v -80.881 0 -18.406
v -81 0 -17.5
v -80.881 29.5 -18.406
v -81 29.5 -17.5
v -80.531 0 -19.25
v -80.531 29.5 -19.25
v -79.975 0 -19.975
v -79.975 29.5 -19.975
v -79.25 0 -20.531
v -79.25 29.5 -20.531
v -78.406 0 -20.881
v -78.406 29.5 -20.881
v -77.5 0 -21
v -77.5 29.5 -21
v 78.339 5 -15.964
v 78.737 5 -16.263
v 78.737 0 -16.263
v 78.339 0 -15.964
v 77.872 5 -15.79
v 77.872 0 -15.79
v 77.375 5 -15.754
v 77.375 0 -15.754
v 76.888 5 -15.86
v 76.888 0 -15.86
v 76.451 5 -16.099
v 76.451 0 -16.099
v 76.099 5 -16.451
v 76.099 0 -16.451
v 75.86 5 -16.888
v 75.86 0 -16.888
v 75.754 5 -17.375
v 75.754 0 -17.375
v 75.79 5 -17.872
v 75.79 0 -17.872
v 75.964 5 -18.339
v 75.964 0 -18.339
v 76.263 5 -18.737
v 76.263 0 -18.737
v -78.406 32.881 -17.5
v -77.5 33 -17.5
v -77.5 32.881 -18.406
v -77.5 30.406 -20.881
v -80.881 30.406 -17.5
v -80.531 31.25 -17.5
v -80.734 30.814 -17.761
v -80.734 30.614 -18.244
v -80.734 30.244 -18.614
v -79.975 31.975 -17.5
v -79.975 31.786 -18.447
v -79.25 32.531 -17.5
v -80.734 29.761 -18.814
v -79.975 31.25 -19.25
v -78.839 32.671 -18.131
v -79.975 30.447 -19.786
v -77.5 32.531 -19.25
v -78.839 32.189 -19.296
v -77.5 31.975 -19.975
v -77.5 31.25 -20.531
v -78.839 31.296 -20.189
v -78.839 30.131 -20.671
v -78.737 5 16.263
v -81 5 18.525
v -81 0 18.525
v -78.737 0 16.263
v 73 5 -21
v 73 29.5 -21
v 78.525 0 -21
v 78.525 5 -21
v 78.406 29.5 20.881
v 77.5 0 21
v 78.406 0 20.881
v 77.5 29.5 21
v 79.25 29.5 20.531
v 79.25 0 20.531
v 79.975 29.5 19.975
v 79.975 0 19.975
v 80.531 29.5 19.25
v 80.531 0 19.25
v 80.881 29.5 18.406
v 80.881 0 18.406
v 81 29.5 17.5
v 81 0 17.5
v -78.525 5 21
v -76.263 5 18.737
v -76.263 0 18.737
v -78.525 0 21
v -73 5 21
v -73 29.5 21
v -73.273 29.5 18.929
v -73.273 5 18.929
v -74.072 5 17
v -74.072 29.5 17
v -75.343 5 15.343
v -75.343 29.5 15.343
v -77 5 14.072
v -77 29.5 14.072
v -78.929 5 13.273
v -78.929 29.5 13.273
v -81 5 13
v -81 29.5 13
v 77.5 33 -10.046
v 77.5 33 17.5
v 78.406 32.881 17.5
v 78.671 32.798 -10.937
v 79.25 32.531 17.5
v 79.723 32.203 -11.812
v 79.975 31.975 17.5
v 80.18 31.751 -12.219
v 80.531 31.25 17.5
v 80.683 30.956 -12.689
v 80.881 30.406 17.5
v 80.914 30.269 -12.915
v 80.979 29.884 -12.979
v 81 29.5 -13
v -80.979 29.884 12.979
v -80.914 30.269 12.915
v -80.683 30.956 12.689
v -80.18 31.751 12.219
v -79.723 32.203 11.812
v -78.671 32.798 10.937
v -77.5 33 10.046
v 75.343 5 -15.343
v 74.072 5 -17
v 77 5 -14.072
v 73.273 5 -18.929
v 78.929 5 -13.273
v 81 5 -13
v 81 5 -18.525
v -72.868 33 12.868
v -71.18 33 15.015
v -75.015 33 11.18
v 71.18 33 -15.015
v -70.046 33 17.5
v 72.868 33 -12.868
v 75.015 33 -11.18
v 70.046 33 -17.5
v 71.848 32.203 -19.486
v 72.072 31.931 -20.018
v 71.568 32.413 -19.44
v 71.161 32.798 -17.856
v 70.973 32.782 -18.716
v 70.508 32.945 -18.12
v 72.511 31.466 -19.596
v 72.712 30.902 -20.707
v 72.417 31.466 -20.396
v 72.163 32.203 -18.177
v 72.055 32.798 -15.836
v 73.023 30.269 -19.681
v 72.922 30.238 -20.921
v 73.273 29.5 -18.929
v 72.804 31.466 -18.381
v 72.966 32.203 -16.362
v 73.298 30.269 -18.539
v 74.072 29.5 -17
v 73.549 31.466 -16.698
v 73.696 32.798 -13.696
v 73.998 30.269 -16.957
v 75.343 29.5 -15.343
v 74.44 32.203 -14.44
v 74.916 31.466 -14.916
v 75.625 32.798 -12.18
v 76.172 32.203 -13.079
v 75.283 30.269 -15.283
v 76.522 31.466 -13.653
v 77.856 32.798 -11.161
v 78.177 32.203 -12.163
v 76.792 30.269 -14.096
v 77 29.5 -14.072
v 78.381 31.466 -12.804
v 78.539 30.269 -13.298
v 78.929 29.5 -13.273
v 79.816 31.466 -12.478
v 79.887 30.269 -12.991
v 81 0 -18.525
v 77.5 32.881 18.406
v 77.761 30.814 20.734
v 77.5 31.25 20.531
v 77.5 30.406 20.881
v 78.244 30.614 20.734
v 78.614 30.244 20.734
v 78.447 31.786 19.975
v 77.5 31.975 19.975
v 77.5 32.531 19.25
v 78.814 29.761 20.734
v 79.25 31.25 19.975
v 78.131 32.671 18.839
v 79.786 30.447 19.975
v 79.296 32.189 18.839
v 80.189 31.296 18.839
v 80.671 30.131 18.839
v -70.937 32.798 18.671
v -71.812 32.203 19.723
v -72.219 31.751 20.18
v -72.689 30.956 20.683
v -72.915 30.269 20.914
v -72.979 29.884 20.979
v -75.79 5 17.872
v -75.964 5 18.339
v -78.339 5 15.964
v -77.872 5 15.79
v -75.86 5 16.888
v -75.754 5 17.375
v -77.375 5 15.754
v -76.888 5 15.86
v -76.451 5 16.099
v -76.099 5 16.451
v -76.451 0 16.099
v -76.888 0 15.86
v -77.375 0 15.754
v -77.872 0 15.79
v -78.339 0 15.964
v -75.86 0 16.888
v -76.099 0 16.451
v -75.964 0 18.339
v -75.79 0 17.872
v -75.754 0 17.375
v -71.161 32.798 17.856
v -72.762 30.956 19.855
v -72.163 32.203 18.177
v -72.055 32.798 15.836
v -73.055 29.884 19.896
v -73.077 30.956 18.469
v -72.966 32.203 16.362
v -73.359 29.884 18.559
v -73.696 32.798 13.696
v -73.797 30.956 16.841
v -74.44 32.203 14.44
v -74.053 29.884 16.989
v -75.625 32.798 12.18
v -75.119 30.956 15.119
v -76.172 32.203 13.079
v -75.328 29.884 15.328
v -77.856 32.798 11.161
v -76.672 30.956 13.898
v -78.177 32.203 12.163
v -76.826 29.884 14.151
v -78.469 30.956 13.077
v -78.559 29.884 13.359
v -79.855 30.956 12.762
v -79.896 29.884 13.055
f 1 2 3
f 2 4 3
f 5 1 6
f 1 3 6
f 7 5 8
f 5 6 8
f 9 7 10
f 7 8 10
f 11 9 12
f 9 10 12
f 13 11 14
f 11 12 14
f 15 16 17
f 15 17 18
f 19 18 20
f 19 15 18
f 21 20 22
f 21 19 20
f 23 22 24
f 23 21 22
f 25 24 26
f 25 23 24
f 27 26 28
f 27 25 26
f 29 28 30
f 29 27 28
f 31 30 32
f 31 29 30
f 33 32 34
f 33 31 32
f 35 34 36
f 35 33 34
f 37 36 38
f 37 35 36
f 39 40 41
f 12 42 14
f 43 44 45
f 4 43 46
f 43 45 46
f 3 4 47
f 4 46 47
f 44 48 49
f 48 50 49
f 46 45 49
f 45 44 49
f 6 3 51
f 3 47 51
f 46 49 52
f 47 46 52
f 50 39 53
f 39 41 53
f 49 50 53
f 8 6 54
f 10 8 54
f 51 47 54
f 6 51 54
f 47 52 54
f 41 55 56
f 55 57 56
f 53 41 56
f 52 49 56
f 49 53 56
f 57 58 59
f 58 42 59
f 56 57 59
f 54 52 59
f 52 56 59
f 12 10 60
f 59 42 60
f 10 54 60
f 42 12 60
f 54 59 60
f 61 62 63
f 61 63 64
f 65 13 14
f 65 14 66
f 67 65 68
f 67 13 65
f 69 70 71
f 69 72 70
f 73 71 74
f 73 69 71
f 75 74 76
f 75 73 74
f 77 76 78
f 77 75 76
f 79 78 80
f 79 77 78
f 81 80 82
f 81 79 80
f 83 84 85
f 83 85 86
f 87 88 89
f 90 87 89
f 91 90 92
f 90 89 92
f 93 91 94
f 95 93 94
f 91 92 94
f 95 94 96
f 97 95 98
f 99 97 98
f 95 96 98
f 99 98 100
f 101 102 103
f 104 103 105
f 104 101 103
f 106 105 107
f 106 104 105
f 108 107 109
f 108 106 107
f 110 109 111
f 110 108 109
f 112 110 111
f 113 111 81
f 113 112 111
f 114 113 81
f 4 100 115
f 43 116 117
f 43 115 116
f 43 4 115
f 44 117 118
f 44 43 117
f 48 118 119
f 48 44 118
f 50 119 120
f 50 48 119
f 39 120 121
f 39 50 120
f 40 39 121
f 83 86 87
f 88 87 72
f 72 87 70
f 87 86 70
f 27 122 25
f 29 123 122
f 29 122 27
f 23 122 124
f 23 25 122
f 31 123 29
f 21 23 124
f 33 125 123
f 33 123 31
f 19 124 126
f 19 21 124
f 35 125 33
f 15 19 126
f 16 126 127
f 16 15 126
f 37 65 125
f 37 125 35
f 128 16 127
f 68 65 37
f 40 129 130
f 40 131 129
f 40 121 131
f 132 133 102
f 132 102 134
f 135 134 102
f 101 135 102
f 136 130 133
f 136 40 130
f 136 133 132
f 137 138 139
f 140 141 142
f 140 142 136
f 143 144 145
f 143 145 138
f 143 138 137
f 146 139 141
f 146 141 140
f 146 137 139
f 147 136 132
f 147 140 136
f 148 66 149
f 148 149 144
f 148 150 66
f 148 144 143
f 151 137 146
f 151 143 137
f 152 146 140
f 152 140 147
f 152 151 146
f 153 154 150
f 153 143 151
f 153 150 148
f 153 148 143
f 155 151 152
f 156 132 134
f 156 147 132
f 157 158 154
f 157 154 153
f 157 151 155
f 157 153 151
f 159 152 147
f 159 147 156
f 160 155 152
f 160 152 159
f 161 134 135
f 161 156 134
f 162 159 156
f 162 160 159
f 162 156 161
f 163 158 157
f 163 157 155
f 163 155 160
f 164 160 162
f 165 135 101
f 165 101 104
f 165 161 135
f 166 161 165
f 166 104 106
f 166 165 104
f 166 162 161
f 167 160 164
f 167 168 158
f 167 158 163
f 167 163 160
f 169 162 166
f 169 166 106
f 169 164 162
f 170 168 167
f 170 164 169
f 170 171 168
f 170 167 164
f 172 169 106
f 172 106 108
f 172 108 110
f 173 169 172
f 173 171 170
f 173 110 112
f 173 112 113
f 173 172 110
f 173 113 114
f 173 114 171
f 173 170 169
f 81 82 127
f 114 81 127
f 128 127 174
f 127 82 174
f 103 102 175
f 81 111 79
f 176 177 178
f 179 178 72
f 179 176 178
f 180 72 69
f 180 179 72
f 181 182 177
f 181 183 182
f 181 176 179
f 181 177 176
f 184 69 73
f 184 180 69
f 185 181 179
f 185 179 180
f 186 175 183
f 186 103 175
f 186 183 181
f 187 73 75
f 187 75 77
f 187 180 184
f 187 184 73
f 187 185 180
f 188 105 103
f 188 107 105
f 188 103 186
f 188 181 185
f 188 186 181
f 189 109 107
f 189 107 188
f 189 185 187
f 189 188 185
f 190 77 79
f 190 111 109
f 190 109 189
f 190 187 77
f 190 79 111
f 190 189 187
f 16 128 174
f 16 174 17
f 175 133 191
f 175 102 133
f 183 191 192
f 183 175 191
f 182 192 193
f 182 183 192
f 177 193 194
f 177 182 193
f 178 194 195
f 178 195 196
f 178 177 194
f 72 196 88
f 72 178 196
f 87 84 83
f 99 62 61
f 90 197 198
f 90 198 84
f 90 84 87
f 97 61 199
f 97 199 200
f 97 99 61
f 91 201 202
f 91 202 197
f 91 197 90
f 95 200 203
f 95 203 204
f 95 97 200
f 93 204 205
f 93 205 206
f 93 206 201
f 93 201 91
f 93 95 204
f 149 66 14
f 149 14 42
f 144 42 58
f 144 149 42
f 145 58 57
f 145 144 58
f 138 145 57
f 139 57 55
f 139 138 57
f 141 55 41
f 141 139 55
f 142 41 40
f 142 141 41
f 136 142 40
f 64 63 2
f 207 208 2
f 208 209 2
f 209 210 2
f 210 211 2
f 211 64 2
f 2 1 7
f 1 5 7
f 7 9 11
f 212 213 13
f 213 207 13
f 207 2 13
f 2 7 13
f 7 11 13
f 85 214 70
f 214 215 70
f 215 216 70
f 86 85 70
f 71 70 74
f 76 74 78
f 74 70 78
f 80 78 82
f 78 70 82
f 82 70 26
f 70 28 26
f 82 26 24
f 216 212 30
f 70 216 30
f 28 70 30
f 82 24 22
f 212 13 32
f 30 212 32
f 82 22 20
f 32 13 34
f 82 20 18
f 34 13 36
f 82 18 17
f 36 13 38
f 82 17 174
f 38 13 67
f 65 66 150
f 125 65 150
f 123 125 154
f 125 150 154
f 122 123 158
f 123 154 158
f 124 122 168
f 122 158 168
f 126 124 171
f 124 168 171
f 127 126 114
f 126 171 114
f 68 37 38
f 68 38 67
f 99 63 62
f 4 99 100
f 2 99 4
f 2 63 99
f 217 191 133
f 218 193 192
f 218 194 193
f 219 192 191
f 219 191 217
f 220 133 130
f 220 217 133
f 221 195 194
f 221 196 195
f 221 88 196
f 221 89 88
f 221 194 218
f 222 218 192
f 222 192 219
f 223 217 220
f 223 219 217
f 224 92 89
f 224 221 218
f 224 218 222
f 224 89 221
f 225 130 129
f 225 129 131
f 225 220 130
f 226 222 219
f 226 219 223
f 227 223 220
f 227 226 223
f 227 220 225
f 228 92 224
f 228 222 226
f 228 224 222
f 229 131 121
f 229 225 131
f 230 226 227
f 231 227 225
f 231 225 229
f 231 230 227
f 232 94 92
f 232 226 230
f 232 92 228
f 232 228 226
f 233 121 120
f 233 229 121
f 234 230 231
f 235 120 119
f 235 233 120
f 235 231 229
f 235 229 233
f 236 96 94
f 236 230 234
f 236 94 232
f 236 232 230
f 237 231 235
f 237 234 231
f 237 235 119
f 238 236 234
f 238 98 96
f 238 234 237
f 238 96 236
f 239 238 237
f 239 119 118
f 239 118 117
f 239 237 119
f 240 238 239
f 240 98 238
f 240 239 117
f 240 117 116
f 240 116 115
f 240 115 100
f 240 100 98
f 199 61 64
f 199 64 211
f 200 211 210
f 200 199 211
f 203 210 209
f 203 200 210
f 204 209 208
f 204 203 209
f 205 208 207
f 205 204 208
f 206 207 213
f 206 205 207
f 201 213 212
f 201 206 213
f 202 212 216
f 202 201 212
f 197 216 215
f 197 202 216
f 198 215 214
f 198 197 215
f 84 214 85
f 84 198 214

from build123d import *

# Parameters (mm, degrees)
SKIZZE1_W                       = 162
SKIZZE1_H                       = 42
AUFSATZ_LINEAR_AUSTRAGEN1_DEPTH = 33
SKIZZE2_R                       = 8
SCHNITT_LINEAR_AUSTRAGEN1_DEPTH = 28
VERRUNDUNG1_R                   = 3.5
SCHNITT_LINEAR_AUSTRAGEN2_DEPTH = 89.238313821


with BuildPart() as part:
    # Skizze1 → Aufsatz-Linear austragen1 (new body)
    with BuildSketch(Plane(origin=(0, 0, 0), x_dir=(1, 0, 0), z_dir=(0, 1, 0))):
        Rectangle(SKIZZE1_W, SKIZZE1_H)
    extrude(amount=AUFSATZ_LINEAR_AUSTRAGEN1_DEPTH)

    # Skizze2 → Schnitt-Linear austragen1 (cut)
    with BuildSketch(Plane(origin=(0, 33, 0), x_dir=(1, 0, 0), z_dir=(0, 1, 0))):
        with Locations((-81, -21)):
            Circle(SKIZZE2_R)
        with Locations((81, 21)):
            Circle(SKIZZE2_R)
    extrude(amount=-SCHNITT_LINEAR_AUSTRAGEN1_DEPTH, mode=Mode.SUBTRACT)

    # Verrundung1
    verrundung1_edges = [part.edges().sort_by_distance(p)[0] for p in [
        (81, 33, 4),
        (4, 33, 21),
        (-75.343145751, 33, 15.343145751),
        (-4, 33, -21),
        (75.343145751, 33, -15.343145751),
        (-81, 33, -4),
        (-81, 16.5, -21),
        (81, 16.5, 21),
    ]]
    fillet(verrundung1_edges, radius=VERRUNDUNG1_R)

    # Skizze3 → Schnitt-Linear austragen2 (cut, through all)
    with BuildSketch(Plane(origin=(0, 5, 0), x_dir=(1, 0, 0), z_dir=(0, 1, 0))):
        with BuildLine():
            Line((76.262563133, 18.737436867), (79.762563133, 22.237436867))
            ThreePointArc((79.762563133, 22.237436867), (82.237436867, 22.237436867), (82.237436867, 19.762563133))
            Line((82.237436867, 19.762563133), (78.737436867, 16.262563133))
            ThreePointArc((78.737436867, 16.262563133), (76.262563133, 16.262563133), (76.262563133, 18.737436867))
        make_face()
        with BuildLine():
            Line((-76.262563133, -18.737436867), (-79.762563133, -22.237436867))
            ThreePointArc((-79.762563133, -22.237436867), (-82.237436867, -22.237436867), (-82.237436867, -19.762563133))
            Line((-82.237436867, -19.762563133), (-78.737436867, -16.262563133))
            ThreePointArc((-78.737436867, -16.262563133), (-76.262563133, -16.262563133), (-76.262563133, -18.737436867))
        make_face()
    extrude(amount=-SCHNITT_LINEAR_AUSTRAGEN2_DEPTH, mode=Mode.SUBTRACT)


solid = part.part
